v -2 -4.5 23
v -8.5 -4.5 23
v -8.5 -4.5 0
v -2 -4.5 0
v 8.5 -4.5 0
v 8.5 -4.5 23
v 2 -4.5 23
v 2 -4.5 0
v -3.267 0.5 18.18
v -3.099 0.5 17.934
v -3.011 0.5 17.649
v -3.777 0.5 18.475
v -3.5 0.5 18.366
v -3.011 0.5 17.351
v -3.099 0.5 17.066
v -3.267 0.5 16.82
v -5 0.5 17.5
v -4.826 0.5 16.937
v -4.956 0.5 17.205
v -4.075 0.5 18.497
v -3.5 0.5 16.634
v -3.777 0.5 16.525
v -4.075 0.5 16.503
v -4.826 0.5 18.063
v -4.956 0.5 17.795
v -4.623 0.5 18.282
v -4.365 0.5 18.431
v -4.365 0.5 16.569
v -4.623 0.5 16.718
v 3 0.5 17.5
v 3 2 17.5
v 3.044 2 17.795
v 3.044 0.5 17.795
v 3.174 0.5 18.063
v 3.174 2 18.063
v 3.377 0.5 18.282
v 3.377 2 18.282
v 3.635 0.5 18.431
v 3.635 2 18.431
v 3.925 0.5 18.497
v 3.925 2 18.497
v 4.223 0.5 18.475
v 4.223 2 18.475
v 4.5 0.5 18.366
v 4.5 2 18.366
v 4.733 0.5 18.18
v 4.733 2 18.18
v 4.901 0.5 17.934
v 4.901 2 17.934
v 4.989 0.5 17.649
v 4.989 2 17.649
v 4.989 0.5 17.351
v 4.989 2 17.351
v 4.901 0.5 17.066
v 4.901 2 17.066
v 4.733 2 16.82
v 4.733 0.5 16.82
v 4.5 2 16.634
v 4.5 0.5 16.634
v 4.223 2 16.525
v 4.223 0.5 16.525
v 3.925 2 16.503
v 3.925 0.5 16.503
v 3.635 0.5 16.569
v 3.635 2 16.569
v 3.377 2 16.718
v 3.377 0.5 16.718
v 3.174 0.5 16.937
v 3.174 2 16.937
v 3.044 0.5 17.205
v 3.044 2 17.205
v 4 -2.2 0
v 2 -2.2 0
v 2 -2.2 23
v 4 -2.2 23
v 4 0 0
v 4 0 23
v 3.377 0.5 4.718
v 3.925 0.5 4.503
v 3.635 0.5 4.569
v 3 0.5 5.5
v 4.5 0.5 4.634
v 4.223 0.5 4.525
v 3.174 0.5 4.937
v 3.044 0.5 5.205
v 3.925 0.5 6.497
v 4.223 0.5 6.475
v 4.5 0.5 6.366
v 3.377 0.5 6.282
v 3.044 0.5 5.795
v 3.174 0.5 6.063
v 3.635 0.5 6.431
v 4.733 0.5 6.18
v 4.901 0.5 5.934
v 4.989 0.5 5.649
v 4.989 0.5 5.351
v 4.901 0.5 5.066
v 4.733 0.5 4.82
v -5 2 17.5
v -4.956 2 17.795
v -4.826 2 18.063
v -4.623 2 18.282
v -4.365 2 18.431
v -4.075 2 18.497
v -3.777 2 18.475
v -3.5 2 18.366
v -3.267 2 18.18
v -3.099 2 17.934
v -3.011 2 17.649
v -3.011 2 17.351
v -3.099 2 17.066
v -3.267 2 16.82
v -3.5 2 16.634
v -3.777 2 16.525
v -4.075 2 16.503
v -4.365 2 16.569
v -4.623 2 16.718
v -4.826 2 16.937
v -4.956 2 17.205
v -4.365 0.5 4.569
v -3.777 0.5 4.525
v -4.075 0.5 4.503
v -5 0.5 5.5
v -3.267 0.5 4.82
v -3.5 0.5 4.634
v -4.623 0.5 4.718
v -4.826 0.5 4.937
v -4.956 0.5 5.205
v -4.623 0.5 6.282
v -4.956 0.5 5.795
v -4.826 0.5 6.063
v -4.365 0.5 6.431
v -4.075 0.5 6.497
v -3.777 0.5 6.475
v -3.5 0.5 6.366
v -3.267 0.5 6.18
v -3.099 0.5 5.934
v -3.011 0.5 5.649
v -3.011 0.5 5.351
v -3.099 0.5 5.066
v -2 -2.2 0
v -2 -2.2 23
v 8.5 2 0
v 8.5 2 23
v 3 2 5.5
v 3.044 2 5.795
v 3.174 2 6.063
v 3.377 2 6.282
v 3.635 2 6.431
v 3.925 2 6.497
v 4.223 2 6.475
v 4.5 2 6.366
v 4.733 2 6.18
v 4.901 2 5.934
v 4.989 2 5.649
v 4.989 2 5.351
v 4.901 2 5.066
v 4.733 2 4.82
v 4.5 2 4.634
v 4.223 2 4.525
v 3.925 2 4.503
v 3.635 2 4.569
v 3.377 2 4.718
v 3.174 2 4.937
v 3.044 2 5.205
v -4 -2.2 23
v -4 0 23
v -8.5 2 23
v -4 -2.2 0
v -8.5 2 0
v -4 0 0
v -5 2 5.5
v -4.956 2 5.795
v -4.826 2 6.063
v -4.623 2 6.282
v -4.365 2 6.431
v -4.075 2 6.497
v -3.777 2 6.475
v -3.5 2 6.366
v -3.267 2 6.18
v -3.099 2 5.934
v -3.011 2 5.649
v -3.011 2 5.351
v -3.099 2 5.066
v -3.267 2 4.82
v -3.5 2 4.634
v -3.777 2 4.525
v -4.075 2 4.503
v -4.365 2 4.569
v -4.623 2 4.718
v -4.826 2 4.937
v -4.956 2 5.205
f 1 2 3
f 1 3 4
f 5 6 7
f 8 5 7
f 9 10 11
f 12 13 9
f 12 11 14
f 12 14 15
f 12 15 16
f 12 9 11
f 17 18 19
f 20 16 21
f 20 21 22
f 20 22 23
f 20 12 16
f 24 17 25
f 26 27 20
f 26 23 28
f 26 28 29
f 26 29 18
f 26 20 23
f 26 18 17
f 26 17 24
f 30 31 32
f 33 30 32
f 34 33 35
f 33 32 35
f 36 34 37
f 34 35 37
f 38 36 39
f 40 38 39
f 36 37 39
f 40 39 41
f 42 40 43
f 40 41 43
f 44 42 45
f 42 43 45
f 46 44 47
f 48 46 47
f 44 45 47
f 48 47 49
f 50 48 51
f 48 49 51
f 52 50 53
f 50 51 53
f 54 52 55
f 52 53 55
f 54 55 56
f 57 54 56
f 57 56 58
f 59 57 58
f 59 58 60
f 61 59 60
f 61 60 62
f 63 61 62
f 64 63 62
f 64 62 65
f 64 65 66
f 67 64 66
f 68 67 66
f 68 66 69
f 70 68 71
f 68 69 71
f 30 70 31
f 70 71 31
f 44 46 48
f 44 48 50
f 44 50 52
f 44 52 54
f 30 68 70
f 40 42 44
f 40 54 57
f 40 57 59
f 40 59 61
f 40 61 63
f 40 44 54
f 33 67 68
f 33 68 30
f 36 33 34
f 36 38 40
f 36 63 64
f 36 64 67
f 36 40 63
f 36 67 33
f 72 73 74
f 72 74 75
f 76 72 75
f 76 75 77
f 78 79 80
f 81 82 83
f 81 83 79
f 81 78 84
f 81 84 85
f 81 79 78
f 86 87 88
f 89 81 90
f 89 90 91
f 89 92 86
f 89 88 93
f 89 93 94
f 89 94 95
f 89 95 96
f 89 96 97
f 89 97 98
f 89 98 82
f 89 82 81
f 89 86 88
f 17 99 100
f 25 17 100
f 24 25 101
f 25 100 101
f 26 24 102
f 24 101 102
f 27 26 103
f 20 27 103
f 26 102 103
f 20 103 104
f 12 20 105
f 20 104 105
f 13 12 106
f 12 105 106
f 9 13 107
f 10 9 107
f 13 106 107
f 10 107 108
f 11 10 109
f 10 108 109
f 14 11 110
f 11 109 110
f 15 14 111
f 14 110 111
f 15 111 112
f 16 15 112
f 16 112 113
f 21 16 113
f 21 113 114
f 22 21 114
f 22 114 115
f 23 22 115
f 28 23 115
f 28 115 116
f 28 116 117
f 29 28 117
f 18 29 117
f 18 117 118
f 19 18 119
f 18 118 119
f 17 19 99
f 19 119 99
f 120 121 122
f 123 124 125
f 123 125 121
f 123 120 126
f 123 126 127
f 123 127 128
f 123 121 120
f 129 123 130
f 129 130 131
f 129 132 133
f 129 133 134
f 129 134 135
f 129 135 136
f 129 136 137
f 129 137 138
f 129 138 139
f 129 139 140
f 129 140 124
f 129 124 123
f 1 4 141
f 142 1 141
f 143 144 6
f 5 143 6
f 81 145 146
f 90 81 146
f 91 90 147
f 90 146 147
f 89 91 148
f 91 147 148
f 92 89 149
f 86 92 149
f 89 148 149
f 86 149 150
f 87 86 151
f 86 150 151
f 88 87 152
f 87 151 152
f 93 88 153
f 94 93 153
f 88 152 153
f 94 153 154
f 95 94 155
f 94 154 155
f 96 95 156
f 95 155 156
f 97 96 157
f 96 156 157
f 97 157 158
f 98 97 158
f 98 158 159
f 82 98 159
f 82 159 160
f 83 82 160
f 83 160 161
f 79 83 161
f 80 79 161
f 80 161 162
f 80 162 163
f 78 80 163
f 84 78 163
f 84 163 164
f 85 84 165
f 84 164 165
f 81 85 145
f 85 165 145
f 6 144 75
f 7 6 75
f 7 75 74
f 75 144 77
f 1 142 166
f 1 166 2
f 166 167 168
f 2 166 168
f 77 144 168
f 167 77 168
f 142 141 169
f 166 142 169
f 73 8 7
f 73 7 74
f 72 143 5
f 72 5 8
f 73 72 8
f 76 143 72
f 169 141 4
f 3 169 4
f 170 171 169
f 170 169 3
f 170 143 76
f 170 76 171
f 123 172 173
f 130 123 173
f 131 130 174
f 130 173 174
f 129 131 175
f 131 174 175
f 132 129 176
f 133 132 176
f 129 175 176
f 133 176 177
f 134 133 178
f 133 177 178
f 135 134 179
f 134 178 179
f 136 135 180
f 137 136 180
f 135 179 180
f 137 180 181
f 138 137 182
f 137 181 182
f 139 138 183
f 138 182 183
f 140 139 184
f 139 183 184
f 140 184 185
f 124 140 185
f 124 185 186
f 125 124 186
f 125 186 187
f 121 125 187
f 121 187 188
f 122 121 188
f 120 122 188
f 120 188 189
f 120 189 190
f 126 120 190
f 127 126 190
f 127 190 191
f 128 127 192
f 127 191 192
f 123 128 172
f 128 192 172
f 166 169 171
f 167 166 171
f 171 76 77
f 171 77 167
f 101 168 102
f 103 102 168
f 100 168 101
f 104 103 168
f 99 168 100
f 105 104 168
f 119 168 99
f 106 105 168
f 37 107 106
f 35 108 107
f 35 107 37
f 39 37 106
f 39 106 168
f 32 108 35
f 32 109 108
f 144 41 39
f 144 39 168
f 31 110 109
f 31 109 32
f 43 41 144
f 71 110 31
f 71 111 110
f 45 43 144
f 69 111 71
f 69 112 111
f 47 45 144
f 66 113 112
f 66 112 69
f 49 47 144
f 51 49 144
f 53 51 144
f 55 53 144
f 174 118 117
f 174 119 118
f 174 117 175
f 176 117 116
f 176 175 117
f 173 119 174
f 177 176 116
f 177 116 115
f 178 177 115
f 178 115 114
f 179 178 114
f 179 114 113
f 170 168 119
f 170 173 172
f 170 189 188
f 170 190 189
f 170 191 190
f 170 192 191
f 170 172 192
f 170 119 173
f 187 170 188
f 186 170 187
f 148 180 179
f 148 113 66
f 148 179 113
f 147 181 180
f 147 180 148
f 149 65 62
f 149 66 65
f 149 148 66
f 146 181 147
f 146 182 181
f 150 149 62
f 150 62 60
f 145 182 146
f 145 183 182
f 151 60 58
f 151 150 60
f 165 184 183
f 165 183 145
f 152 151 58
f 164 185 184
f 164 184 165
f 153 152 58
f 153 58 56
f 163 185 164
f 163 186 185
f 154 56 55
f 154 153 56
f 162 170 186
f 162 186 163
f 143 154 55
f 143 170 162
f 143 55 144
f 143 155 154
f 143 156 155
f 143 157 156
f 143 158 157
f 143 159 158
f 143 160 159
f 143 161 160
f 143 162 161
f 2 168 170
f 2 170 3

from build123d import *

# Parameters (mm, degrees)
DODANIE_WYCI_GNI_CIE1_DEPTH = 23
SZKIC2_R                    = 1
WYTNIJ_WYCI_GNI_CIE1_DEPTH  = 1.5


with BuildPart() as part:
    # Szkic1 → Dodanie-wyciągnięcie1 (new body)
    with BuildSketch(Plane.XY):
        Polygon((0, 0), (0, 2), (-8.5, 2), (-8.5, -4.5), (-2, -4.5), (-2, -2.2), (-4, -2.2), (-4, 0), align=None)
    dodanie_wyci_gni_cie1 = extrude(amount=DODANIE_WYCI_GNI_CIE1_DEPTH)

    # Lustro1: Dodanie-wyciągnięcie1 across plane
    add(dodanie_wyci_gni_cie1.mirror(Plane(origin=(0, 0, 23), x_dir=(0, 0, 1), z_dir=(-1, 0, 0))))

    # Szkic2 → Wytnij-wyciągnięcie1 (cut)
    with BuildSketch(Plane(origin=(0, 2, 0), x_dir=(1, 0, 0), z_dir=(0, 1, 0))):
        with Locations(Location((-4, -5.5, 0), (0, 0, 180))):
            Circle(SZKIC2_R)
        with Locations(Location((4, -5.5, 0), (0, 0, 180))):
            Circle(SZKIC2_R)
        with Locations(Location((4, -17.5, 0), (0, 0, 180))):
            Circle(SZKIC2_R)
        with Locations(Location((-4, -17.5, 0), (0, 0, 180))):
            Circle(SZKIC2_R)
    extrude(amount=-WYTNIJ_WYCI_GNI_CIE1_DEPTH, mode=Mode.SUBTRACT)


solid = part.part
